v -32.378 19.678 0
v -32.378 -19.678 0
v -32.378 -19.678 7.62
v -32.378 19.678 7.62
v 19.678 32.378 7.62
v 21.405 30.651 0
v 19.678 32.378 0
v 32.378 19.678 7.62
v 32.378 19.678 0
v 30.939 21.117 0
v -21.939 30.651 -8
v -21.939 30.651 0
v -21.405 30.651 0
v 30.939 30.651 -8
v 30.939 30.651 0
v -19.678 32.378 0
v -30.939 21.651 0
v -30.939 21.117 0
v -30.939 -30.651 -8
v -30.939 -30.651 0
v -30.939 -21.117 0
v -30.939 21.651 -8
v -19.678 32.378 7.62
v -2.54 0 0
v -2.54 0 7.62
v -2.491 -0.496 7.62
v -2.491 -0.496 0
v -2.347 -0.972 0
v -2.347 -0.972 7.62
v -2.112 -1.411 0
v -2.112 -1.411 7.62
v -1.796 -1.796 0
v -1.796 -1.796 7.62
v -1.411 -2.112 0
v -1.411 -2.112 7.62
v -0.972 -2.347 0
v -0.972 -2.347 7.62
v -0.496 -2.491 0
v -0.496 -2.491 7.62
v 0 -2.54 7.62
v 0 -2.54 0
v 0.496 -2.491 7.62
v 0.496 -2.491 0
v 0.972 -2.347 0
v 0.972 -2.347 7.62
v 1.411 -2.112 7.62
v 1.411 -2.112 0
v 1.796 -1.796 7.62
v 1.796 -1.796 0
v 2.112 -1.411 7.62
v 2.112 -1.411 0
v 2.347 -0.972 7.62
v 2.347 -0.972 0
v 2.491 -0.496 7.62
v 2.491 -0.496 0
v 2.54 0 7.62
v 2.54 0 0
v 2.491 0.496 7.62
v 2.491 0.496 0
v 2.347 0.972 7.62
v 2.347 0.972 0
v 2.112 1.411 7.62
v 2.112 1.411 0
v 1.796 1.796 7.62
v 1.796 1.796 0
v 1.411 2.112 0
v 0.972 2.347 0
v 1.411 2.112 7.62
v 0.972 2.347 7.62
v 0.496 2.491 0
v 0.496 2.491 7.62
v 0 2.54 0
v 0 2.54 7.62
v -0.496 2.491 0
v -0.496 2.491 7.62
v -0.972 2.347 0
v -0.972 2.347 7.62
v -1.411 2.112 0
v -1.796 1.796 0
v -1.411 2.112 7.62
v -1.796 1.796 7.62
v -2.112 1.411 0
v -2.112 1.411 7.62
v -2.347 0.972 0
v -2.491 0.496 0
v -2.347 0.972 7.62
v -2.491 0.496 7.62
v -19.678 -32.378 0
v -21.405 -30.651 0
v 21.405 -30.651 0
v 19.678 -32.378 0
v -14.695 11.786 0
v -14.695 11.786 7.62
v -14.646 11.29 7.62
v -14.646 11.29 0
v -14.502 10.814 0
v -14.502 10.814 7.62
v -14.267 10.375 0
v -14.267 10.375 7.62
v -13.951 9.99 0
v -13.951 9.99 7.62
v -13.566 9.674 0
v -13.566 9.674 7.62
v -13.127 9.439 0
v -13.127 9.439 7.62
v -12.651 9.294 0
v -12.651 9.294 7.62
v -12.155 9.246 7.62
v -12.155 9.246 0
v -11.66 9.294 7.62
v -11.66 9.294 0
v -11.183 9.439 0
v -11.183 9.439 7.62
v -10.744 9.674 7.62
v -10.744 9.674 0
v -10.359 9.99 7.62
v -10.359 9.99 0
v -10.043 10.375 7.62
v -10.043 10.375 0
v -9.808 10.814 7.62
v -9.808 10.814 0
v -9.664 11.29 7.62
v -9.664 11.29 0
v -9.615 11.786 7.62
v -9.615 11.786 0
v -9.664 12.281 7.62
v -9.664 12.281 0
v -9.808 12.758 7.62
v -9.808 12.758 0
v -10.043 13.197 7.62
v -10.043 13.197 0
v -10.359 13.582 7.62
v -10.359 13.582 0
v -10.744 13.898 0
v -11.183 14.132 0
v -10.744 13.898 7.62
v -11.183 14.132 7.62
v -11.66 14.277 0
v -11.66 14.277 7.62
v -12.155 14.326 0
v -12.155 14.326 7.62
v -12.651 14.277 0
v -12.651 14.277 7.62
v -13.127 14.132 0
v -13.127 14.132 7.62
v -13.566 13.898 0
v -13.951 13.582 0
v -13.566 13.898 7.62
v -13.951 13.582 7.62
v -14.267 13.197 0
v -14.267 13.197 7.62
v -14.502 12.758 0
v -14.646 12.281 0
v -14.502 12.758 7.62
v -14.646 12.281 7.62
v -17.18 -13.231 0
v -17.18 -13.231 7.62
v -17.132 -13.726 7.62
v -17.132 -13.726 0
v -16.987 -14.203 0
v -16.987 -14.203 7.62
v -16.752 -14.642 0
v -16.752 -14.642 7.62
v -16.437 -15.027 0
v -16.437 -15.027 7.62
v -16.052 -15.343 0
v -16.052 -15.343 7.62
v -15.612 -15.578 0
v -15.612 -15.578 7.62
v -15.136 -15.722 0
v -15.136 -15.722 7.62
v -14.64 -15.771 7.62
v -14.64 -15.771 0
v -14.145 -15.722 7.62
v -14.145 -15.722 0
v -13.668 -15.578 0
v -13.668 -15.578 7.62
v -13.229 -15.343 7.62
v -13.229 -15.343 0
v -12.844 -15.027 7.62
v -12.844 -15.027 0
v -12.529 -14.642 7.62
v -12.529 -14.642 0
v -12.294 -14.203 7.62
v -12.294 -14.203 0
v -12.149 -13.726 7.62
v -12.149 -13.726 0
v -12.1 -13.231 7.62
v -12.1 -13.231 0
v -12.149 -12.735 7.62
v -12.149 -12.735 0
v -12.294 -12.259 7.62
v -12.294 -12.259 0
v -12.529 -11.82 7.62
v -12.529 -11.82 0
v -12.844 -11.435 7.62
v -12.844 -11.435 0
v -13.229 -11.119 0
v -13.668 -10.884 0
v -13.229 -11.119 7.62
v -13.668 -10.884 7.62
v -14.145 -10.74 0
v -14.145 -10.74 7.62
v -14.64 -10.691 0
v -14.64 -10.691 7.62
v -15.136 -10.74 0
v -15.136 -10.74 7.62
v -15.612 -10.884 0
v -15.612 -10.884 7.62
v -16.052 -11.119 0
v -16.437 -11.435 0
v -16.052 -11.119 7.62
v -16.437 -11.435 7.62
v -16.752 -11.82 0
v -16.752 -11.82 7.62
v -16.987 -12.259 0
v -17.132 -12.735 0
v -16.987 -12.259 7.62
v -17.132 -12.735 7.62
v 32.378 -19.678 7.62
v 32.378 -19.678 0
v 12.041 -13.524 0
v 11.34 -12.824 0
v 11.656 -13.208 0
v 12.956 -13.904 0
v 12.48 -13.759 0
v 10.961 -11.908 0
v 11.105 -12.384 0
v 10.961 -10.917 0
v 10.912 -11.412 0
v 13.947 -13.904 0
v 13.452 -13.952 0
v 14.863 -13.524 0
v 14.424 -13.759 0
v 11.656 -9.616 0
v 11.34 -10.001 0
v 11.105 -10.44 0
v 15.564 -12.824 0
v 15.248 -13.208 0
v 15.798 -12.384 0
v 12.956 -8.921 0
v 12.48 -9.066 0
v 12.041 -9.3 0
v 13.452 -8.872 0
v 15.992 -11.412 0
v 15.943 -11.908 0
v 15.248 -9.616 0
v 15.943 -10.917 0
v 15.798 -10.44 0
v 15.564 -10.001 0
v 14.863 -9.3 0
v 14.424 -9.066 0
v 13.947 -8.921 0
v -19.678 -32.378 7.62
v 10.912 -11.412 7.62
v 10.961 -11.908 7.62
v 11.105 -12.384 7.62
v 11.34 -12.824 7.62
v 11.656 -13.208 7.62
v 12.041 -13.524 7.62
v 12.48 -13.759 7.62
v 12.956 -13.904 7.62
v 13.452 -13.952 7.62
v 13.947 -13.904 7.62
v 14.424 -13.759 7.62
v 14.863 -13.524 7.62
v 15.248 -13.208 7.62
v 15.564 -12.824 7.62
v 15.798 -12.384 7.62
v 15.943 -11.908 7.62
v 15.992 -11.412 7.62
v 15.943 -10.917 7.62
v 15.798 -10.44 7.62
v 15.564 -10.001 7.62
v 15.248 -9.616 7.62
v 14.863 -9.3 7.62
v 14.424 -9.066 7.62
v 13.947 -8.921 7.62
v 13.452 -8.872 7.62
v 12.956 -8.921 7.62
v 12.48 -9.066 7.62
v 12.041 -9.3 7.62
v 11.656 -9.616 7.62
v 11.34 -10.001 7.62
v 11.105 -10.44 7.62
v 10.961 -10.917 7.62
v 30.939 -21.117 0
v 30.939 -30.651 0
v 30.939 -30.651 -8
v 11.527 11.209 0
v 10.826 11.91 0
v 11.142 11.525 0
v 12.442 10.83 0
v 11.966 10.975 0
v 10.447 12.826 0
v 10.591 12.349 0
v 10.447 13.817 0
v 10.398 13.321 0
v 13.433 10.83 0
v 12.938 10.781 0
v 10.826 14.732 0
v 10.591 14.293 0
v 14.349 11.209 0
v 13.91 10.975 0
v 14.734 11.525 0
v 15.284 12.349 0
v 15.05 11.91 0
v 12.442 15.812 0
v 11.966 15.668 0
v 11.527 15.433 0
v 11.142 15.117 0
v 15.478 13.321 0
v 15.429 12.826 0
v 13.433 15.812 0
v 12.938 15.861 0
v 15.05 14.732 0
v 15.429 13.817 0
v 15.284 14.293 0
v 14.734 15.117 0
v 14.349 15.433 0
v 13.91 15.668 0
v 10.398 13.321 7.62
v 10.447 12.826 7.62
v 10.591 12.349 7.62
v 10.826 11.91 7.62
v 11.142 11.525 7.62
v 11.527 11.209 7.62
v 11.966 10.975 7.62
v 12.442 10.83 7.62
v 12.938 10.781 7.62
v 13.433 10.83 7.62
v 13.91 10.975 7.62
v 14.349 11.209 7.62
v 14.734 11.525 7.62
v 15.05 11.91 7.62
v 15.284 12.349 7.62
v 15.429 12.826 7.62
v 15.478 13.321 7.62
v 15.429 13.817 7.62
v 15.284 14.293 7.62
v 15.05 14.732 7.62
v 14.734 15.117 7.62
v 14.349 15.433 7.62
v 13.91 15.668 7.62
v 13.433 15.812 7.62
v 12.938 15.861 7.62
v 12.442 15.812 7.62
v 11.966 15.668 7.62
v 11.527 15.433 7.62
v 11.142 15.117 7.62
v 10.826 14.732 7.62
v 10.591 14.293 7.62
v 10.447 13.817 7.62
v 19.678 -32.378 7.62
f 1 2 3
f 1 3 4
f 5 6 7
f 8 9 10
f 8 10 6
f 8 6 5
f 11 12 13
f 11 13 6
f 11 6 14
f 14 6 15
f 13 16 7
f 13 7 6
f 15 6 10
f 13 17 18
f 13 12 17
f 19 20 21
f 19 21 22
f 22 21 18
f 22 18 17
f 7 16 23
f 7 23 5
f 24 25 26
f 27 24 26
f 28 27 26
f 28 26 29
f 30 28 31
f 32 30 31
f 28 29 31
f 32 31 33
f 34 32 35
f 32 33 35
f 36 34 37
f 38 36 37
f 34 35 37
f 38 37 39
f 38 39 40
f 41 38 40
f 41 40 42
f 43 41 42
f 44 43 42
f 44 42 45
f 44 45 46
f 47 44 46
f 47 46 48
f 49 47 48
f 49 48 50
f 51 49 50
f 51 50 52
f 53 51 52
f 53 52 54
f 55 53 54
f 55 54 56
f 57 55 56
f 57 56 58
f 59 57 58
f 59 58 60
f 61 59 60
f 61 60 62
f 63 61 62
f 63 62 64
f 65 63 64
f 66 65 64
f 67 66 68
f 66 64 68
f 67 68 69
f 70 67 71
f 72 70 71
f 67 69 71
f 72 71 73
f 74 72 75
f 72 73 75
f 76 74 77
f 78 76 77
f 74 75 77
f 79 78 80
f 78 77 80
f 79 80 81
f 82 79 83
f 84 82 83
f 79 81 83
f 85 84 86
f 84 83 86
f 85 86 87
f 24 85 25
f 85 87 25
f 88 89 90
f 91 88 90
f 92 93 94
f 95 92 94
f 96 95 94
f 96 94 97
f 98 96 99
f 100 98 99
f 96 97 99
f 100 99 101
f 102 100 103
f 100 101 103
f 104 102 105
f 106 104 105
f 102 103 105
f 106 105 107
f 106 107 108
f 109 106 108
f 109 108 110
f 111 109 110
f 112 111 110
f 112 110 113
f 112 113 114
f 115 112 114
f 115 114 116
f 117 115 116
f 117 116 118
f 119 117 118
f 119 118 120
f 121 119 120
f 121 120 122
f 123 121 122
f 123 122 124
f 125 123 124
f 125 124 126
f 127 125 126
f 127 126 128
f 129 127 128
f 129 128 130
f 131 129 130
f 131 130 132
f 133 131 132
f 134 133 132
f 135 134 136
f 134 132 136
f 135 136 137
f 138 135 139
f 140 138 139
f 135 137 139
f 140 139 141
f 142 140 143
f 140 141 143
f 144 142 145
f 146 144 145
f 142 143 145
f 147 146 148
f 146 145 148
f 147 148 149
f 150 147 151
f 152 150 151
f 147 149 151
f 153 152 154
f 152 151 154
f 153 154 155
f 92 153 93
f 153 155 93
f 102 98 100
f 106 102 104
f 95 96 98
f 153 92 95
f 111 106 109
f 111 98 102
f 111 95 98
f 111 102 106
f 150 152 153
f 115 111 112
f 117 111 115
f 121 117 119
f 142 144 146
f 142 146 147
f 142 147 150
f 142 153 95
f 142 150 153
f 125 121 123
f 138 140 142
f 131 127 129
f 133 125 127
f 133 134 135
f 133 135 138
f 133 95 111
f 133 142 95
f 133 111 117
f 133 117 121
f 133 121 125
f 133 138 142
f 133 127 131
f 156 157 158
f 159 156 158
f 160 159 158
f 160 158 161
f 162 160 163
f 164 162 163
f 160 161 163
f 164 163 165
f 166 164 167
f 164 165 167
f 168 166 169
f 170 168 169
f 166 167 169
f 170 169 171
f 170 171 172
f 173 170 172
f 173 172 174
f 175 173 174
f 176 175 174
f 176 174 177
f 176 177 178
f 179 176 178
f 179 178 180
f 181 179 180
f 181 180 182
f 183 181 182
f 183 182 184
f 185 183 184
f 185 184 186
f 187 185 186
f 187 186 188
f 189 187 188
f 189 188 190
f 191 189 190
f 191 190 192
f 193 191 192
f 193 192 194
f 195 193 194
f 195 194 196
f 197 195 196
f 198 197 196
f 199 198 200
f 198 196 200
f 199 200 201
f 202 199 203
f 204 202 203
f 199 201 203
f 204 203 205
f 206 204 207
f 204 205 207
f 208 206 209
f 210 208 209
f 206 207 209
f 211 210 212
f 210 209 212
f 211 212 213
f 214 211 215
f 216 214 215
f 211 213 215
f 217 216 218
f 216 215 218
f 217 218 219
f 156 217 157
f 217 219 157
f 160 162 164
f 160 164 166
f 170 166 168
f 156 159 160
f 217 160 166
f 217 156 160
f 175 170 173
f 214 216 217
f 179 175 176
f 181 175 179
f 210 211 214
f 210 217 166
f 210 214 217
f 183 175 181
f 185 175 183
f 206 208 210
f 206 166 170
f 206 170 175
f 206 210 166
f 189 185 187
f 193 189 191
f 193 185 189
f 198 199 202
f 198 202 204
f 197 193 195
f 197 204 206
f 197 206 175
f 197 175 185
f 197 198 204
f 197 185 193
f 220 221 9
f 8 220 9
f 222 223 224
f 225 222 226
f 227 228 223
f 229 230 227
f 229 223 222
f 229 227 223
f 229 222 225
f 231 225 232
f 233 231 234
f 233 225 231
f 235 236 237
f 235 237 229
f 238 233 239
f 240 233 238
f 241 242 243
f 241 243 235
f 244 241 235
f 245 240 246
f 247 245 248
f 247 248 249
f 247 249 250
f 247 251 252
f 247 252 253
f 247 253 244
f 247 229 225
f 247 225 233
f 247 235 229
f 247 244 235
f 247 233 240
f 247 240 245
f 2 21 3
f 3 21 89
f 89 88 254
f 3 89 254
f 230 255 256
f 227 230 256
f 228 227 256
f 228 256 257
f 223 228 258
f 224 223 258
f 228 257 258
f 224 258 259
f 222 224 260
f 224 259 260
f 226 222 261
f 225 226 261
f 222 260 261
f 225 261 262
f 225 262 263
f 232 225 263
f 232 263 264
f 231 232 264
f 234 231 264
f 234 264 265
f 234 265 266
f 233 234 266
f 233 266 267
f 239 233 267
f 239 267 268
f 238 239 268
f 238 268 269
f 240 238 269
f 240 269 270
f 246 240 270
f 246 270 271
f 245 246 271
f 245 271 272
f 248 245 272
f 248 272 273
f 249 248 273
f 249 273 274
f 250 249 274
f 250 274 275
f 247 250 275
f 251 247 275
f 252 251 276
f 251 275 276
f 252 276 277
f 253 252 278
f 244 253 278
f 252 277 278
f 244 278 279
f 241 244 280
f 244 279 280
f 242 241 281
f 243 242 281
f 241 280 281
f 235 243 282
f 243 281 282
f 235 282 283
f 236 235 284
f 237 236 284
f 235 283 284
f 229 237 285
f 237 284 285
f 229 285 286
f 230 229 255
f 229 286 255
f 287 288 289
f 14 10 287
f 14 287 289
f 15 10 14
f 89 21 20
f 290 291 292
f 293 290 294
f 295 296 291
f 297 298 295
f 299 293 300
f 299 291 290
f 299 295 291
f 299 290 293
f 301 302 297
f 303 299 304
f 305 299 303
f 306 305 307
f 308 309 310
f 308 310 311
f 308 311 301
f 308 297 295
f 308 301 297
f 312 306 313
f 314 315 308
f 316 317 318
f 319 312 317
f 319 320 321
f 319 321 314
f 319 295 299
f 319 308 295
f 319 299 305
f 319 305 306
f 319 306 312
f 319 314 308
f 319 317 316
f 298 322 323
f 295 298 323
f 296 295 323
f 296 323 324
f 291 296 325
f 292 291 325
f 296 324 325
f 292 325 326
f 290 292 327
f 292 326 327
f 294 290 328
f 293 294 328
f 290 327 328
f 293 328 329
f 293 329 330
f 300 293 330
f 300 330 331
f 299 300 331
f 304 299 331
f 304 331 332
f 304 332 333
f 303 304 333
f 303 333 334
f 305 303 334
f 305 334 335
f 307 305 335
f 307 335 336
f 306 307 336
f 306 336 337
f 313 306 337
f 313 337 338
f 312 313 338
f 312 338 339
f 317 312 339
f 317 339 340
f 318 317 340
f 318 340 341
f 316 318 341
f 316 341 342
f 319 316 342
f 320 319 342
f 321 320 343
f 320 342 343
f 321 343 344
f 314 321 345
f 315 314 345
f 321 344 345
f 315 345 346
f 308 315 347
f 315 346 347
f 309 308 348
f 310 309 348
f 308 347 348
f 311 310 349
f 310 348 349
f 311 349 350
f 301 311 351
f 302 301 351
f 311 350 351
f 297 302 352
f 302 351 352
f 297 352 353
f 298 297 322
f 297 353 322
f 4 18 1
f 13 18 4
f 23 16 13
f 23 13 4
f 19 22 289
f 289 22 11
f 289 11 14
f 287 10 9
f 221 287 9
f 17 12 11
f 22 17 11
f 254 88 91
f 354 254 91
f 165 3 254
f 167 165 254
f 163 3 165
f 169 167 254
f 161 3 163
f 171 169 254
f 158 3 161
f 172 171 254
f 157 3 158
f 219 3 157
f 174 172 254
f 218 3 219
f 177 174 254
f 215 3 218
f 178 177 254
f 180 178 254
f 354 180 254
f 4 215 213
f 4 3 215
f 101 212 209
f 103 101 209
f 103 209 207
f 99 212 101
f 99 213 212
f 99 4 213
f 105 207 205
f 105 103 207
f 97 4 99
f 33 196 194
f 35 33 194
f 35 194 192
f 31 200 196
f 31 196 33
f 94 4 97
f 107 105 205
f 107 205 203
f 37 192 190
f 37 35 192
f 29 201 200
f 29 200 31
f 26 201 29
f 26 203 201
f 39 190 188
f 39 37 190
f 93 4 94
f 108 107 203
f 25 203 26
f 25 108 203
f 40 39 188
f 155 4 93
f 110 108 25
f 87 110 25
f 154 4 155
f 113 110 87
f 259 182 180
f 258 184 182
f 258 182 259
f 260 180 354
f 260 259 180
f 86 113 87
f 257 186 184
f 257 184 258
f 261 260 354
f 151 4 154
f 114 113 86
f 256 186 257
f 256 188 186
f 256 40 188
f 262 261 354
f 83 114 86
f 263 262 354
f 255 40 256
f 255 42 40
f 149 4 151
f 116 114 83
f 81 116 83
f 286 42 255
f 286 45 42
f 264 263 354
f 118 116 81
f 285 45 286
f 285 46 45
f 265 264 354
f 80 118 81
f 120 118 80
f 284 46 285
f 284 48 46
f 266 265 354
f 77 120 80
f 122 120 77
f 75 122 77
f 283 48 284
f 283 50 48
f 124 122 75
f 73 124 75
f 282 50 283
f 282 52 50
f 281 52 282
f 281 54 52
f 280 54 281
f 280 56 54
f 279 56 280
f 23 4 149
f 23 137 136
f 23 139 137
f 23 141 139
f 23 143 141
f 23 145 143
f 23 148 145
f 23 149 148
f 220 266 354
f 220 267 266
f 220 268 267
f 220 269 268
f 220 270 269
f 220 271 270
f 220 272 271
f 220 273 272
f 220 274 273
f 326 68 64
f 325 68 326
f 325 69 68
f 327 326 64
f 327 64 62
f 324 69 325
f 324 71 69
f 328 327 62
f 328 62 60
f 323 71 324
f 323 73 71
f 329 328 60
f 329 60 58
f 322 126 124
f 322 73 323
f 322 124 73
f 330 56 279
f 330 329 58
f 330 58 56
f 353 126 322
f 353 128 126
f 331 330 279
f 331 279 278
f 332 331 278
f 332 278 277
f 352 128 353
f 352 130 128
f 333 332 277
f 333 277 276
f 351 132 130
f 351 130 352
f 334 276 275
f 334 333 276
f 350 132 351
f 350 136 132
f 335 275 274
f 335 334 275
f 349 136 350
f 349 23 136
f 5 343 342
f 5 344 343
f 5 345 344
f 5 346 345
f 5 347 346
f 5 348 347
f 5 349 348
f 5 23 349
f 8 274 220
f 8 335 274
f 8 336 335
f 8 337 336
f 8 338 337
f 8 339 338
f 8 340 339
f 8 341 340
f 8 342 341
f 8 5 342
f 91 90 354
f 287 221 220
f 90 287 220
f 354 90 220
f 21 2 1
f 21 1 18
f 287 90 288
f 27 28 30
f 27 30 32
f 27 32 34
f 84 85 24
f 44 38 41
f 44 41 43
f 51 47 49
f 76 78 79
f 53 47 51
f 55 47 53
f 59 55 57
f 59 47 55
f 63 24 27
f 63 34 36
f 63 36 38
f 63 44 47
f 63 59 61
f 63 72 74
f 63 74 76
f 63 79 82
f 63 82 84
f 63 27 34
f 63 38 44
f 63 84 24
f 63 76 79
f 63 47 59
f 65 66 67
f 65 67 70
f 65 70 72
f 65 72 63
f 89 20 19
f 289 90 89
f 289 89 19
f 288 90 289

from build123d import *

# Parameters (mm, degrees)
F0_W      = 64.756296
F0_H      = 64.756296
F1_DEPTH  = 7.62
F2_SIZE   = 12.7
F3_SIZE   = 12.7
F4_SIZE   = 12.7
F5_SIZE   = 12.7
F12_D     = 5.08
F13_D     = 5.08
F14_D     = 5.08
F15_D     = 5.08
F6_W      = 61.878238
F6_H      = 61.302628
F16_DEPTH = 8
F17_SIZE  = 9


with BuildPart() as f1:
    # F0 (on Top) → F1 (new body)
    with BuildSketch(Plane.XY):
        Rectangle(F0_W, F0_H)
    extrude(amount=F1_DEPTH)

    # F2
    f2_edges = [f1.edges().sort_by_distance(p)[0] for p in [
        (32.378148, -32.378148, 3.81),
    ]]
    chamfer(f2_edges, length=F2_SIZE)

    # F3
    f3_edges = [f1.edges().sort_by_distance(p)[0] for p in [
        (-32.378148, 32.378148, 3.81),
    ]]
    chamfer(f3_edges, length=F3_SIZE)

    # F4
    f4_edges = [f1.edges().sort_by_distance(p)[0] for p in [
        (-32.378148, -32.378148, 3.81),
    ]]
    chamfer(f4_edges, length=F4_SIZE)

    # F5
    f5_edges = [f1.edges().sort_by_distance(p)[0] for p in [
        (32.378148, 32.378148, 3.81),
    ]]
    chamfer(f5_edges, length=F5_SIZE)

    # F12 (through all)
    with Locations(Plane(origin=(0, 0, 0), x_dir=(1, 0, 0), z_dir=(0, 0, -1))):
        with Locations((13.451747, 11.412409)):
            Hole(F12_D / 2)

    # F13 (through all)
    with Locations(Plane(origin=(0, 0, 0), x_dir=(1, 0, 0), z_dir=(0, 0, -1))):
        with Locations((12.937722, -13.321196)):
            Hole(F13_D / 2)

    # F14 (through all)
    with Locations(Plane(origin=(0, 0, 0), x_dir=(1, 0, 0), z_dir=(0, 0, -1))):
        with Locations((0, 0)):
            Hole(F14_D / 2)

    # F15 (through all)
    with Locations(Plane(origin=(0, 0, 0), x_dir=(1, 0, 0), z_dir=(0, 0, -1))):
        with Locations((-12.155064, -11.785694), (-14.640464, 13.230935)):
            Hole(F15_D / 2)

    # F6 (on Top) → F16 (join)
    with BuildSketch(Plane.XY):
        Rectangle(F6_W, F6_H)
    extrude(amount=-F16_DEPTH)

    # F17
    f17_edges = [f1.edges().sort_by_distance(p)[0] for p in [
        (-30.939119, 30.651314, -4),
    ]]
    chamfer(f17_edges, length=F17_SIZE)


solid = f1.part
